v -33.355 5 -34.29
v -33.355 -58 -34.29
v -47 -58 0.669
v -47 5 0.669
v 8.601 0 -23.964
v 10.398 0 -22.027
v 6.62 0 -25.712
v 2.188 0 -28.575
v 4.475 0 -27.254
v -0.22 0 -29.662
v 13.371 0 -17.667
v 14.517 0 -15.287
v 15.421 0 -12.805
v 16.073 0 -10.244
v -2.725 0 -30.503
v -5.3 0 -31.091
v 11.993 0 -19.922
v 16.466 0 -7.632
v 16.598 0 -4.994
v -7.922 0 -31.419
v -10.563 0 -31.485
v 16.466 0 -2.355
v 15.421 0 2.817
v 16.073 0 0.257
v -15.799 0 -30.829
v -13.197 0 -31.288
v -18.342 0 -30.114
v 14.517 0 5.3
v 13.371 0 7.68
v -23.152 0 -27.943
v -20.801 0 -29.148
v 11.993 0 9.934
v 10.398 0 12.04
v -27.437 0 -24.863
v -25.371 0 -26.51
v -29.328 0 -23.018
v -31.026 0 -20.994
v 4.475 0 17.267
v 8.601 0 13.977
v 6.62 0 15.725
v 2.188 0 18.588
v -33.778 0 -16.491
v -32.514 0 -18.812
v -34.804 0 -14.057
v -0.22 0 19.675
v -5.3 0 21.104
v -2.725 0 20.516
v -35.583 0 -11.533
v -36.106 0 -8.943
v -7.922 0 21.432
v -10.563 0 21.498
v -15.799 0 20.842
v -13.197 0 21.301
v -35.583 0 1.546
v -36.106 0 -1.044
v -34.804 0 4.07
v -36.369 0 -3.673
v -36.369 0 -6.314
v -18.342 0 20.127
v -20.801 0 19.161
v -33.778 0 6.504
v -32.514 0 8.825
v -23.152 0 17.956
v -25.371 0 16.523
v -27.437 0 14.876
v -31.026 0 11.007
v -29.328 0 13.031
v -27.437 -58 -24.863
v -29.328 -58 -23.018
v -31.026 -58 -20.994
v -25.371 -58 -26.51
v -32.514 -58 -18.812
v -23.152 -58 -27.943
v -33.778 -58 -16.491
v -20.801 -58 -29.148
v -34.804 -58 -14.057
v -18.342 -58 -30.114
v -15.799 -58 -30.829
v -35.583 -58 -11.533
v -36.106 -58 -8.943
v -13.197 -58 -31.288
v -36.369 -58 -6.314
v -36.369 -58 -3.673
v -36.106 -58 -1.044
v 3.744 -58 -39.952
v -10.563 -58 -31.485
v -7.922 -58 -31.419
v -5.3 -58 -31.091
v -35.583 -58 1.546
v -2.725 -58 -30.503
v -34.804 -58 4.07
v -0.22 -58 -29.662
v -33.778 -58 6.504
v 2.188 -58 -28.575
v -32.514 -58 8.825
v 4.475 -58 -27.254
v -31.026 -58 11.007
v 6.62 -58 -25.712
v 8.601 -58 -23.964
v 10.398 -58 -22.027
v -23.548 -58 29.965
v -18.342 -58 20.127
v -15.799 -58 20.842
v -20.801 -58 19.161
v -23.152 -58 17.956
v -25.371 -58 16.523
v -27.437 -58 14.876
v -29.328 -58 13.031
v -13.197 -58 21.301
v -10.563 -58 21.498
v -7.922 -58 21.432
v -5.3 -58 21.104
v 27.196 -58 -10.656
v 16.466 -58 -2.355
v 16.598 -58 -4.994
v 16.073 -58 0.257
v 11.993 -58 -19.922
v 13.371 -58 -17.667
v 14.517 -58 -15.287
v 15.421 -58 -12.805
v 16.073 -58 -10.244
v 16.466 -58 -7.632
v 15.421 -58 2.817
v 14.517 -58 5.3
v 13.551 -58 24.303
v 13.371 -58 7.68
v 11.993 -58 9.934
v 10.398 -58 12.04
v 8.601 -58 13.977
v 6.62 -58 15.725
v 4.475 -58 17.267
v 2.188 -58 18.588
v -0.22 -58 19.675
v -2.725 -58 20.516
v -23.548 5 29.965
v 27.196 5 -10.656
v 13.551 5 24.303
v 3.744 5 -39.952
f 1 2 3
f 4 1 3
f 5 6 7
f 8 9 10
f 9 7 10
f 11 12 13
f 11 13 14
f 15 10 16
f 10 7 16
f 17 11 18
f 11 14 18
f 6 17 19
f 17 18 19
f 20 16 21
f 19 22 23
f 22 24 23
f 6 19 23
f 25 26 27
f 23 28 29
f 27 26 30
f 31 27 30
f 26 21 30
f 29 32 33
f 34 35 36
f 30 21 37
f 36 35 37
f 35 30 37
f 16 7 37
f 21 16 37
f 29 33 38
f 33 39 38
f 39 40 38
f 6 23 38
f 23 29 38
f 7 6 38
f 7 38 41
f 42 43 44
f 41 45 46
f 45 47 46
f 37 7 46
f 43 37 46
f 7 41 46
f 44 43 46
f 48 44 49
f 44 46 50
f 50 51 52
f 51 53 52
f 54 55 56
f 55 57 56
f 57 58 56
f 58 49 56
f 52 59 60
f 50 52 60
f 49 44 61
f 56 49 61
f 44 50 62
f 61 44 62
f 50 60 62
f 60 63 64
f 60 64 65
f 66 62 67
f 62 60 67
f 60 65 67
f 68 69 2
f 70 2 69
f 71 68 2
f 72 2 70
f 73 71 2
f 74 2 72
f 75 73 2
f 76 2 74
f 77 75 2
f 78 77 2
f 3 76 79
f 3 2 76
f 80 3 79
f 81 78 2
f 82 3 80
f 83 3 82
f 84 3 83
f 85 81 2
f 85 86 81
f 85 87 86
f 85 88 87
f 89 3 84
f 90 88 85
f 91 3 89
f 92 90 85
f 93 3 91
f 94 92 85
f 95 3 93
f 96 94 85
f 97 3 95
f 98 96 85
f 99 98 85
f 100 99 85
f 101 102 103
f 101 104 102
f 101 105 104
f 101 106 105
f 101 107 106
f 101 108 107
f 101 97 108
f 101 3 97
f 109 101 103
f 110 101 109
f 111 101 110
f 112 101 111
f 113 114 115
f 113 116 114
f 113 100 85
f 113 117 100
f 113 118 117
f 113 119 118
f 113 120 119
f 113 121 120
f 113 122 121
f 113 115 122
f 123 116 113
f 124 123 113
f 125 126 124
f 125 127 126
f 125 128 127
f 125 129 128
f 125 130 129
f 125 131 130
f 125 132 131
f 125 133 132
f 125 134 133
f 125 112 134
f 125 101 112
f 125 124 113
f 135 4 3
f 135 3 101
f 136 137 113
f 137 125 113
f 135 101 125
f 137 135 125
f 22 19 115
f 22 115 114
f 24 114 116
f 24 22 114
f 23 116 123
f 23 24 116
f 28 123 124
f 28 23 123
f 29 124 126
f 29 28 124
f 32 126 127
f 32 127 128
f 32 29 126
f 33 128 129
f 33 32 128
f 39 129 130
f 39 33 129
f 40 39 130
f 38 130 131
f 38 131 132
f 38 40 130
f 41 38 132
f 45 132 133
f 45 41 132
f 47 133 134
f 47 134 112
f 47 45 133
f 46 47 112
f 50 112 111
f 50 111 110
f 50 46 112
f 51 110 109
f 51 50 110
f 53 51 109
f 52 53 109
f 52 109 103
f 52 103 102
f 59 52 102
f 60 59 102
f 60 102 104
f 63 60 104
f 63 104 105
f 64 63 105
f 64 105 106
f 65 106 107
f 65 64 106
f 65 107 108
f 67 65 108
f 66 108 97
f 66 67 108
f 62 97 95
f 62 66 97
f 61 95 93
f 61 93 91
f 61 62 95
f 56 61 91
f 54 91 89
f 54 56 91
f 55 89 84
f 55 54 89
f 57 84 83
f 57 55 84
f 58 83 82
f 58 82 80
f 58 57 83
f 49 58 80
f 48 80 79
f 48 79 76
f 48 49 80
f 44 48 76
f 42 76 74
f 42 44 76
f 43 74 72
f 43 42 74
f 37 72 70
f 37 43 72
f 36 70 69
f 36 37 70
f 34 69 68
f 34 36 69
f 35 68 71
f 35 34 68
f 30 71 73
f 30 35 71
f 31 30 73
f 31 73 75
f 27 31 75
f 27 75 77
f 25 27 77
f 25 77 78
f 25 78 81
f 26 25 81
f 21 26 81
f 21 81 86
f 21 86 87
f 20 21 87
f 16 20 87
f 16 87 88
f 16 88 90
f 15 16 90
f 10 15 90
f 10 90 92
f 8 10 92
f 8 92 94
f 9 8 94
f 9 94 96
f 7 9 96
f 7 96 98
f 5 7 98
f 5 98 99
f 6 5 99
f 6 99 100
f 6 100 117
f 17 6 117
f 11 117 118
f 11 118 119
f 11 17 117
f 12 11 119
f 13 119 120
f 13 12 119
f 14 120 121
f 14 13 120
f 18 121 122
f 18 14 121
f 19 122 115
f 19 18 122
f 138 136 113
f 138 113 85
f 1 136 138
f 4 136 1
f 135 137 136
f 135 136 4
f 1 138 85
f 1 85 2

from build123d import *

# Parameters (mm, degrees)
F0_R     = 26.5
F1_DEPTH = 58
F3_DEPTH = 5


with BuildPart() as f1:
    # F0 (on Front) → F1 (new body)
    with BuildSketch(Plane.XZ):
        Polygon((3.743613, -39.952497), (27.196158, -10.655544), (13.550526, 24.303433), (-23.547653, 29.965456), (-47.000198, 0.668504), (-33.354566, -34.290473), align=None)
        with Locations((-9.90202, -4.99352)):
            Circle(F0_R, mode=Mode.SUBTRACT)
    extrude(amount=F1_DEPTH)

    # F2 (on face) → F3 (join)
    with BuildSketch(Plane(origin=(0, 0, 0), x_dir=(-1, 0, 0), z_dir=(0, 1, 0))):
        Polygon((23.547653, 29.965456), (-13.550526, 24.303433), (-27.196158, -10.655544), (-3.743613, -39.952497), (33.354566, -34.290473), (47.000198, 0.668504), align=None)
    extrude(amount=F3_DEPTH)


solid = f1.part
